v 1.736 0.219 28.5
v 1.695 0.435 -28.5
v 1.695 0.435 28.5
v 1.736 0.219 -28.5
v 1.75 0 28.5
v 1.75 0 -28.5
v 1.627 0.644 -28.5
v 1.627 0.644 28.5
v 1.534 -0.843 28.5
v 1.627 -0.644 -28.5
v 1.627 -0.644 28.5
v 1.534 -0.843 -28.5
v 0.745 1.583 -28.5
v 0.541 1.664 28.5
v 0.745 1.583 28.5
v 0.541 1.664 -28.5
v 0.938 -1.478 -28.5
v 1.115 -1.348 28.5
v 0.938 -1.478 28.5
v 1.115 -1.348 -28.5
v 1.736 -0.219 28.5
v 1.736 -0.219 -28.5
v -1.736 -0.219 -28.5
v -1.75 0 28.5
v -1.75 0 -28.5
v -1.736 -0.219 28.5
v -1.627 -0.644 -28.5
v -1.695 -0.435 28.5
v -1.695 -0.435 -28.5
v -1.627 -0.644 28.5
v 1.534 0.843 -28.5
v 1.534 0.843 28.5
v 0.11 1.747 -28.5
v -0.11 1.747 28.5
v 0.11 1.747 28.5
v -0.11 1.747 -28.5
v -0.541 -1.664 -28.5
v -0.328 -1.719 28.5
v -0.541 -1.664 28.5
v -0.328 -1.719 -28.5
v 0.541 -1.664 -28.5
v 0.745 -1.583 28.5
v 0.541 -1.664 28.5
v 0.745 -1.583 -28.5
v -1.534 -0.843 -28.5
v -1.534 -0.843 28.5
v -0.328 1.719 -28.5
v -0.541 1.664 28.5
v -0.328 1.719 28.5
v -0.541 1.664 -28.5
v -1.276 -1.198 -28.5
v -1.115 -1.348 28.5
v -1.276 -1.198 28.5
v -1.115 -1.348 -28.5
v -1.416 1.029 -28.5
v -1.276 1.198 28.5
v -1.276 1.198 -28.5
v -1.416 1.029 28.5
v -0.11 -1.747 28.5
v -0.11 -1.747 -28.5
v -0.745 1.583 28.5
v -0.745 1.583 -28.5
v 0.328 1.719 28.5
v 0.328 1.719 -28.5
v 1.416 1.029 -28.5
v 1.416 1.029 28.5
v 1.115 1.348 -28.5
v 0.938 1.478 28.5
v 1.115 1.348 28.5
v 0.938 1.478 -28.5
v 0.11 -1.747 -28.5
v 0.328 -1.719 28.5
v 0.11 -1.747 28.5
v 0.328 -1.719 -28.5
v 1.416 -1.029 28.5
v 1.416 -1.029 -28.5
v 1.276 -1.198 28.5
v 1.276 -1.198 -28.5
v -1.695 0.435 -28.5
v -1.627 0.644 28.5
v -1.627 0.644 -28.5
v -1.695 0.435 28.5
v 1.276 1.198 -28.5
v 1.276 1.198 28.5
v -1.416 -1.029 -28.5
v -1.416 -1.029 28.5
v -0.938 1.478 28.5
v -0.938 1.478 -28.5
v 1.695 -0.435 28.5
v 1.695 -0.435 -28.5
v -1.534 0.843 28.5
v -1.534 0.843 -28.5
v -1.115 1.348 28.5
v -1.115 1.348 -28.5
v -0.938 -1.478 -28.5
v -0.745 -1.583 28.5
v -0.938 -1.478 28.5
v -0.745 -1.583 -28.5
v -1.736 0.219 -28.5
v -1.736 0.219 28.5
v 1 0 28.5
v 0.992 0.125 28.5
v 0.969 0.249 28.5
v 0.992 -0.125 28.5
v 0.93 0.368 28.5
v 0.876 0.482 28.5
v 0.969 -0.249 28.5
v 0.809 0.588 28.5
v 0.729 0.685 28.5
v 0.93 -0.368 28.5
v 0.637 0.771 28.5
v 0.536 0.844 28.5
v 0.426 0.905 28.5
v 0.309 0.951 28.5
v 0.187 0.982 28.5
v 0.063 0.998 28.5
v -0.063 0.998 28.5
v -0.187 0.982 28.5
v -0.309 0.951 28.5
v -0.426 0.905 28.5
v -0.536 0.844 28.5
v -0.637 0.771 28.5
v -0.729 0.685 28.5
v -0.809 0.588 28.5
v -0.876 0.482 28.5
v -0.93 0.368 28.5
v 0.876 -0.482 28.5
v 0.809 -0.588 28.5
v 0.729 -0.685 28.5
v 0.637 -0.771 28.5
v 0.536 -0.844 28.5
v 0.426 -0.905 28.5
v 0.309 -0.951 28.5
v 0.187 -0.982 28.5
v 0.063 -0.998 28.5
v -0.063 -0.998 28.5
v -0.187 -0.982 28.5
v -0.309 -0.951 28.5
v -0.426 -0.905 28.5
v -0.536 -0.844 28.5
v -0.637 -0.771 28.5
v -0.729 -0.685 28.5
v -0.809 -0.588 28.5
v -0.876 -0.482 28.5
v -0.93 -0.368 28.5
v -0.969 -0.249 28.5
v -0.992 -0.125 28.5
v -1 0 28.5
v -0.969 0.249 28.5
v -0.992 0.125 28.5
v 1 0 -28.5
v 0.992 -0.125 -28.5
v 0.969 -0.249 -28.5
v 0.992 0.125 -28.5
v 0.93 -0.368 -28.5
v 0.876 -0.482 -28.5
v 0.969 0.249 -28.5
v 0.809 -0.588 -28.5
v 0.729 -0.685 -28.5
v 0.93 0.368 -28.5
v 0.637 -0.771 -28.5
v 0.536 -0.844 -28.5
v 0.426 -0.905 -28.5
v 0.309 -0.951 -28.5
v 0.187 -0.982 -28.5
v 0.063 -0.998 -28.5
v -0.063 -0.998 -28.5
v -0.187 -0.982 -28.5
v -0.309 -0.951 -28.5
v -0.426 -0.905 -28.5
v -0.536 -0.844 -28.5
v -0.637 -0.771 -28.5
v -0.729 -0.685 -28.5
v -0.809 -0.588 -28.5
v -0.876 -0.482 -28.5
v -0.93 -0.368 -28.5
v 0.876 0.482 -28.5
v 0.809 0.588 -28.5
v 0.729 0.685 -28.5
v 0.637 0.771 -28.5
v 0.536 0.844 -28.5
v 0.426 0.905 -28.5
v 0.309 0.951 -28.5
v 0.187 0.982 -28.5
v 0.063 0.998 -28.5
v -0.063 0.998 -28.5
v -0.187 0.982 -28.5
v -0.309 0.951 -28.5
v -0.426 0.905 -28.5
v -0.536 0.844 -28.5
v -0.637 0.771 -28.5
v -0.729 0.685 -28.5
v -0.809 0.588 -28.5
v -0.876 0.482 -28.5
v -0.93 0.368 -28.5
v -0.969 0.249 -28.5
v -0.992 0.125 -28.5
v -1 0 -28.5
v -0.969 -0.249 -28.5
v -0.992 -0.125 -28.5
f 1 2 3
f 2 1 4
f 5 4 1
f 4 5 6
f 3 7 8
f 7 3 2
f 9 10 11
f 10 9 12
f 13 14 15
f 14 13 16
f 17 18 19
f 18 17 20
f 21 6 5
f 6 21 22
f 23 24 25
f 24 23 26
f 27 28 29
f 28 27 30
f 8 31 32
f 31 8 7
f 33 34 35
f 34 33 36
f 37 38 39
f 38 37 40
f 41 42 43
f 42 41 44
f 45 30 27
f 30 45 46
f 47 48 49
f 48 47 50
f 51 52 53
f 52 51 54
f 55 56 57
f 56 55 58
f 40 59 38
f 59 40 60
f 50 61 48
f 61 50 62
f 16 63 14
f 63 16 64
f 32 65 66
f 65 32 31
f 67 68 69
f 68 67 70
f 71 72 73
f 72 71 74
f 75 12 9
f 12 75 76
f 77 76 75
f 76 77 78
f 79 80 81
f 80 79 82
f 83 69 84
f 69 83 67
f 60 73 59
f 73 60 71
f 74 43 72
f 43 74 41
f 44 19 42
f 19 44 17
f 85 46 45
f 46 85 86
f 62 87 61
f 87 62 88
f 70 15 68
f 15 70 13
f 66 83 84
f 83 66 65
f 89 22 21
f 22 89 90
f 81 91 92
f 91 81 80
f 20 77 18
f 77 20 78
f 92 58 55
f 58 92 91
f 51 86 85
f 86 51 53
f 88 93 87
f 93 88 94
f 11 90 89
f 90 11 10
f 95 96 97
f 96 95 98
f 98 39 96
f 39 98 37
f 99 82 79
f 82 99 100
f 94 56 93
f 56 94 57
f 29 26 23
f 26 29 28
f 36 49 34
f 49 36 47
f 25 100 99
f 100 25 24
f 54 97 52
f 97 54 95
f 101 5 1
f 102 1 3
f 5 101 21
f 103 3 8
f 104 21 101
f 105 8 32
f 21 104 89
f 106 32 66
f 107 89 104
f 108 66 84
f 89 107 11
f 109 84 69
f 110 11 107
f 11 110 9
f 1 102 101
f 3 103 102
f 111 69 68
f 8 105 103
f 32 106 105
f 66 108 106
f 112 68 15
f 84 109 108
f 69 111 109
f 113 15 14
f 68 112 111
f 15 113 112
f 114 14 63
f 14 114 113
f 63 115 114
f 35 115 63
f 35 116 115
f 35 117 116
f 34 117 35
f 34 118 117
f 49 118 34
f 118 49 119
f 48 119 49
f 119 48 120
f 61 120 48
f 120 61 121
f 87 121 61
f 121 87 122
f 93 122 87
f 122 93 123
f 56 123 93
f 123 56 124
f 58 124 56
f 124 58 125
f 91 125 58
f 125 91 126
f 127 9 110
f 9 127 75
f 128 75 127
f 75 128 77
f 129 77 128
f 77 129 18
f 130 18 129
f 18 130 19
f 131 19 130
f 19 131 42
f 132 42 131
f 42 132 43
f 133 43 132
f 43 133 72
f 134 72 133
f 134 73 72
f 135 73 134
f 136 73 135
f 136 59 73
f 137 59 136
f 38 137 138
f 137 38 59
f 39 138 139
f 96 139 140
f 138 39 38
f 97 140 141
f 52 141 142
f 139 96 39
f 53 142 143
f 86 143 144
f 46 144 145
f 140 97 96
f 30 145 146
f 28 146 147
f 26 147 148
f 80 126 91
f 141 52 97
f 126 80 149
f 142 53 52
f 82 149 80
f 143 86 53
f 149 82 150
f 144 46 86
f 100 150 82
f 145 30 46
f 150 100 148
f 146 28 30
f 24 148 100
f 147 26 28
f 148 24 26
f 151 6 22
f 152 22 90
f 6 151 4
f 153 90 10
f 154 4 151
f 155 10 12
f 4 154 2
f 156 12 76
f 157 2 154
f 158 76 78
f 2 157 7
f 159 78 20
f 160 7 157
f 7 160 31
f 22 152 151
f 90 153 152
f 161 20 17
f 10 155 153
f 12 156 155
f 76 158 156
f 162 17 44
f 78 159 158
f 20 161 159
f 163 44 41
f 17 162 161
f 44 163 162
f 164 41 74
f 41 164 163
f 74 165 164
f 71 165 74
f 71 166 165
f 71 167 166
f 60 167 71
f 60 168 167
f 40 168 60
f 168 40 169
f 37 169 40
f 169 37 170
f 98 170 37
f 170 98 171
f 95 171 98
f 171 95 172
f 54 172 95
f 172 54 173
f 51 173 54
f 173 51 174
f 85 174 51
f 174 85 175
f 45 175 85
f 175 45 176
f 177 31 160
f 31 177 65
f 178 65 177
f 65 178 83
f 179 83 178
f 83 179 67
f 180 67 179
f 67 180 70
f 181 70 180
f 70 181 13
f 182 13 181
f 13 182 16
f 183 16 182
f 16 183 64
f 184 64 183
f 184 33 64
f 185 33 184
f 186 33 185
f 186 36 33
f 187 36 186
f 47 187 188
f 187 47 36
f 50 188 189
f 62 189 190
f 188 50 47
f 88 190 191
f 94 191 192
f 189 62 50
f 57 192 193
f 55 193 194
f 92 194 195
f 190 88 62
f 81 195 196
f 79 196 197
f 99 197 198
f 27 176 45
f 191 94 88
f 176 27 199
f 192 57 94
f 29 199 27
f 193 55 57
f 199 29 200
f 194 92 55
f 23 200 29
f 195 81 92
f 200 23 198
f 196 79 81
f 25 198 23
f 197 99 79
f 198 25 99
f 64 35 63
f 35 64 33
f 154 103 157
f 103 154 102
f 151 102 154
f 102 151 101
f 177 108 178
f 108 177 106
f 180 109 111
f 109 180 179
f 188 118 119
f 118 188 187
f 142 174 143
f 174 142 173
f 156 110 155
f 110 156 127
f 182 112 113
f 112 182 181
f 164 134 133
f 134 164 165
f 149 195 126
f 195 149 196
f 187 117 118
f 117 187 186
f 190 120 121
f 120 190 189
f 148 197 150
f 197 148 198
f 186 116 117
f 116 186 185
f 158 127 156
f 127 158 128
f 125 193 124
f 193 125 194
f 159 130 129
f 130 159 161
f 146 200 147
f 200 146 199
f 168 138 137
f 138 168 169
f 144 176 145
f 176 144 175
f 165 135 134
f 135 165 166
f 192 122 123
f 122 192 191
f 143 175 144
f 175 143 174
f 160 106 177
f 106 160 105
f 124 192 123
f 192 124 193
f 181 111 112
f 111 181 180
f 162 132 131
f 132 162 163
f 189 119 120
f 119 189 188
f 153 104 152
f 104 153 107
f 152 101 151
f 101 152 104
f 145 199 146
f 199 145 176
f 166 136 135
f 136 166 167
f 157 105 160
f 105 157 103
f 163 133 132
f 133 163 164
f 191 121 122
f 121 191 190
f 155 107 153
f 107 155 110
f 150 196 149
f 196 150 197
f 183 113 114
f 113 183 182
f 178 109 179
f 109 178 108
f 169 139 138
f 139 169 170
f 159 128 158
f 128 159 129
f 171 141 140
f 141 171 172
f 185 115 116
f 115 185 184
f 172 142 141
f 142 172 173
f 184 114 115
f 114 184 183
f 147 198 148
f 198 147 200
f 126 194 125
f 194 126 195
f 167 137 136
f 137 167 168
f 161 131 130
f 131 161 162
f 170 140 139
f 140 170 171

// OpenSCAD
$fn = 50;


difference() {
	union() {
		translate(v = [0, 0, -28.5000000000]) {
			cylinder(h = 57, r = 1.7500000000);
		}
	}
	union() {
		translate(v = [0, 0, -100.0000000000]) {
			cylinder(h = 200, r = 1.0000000000);
		}
	}
}
